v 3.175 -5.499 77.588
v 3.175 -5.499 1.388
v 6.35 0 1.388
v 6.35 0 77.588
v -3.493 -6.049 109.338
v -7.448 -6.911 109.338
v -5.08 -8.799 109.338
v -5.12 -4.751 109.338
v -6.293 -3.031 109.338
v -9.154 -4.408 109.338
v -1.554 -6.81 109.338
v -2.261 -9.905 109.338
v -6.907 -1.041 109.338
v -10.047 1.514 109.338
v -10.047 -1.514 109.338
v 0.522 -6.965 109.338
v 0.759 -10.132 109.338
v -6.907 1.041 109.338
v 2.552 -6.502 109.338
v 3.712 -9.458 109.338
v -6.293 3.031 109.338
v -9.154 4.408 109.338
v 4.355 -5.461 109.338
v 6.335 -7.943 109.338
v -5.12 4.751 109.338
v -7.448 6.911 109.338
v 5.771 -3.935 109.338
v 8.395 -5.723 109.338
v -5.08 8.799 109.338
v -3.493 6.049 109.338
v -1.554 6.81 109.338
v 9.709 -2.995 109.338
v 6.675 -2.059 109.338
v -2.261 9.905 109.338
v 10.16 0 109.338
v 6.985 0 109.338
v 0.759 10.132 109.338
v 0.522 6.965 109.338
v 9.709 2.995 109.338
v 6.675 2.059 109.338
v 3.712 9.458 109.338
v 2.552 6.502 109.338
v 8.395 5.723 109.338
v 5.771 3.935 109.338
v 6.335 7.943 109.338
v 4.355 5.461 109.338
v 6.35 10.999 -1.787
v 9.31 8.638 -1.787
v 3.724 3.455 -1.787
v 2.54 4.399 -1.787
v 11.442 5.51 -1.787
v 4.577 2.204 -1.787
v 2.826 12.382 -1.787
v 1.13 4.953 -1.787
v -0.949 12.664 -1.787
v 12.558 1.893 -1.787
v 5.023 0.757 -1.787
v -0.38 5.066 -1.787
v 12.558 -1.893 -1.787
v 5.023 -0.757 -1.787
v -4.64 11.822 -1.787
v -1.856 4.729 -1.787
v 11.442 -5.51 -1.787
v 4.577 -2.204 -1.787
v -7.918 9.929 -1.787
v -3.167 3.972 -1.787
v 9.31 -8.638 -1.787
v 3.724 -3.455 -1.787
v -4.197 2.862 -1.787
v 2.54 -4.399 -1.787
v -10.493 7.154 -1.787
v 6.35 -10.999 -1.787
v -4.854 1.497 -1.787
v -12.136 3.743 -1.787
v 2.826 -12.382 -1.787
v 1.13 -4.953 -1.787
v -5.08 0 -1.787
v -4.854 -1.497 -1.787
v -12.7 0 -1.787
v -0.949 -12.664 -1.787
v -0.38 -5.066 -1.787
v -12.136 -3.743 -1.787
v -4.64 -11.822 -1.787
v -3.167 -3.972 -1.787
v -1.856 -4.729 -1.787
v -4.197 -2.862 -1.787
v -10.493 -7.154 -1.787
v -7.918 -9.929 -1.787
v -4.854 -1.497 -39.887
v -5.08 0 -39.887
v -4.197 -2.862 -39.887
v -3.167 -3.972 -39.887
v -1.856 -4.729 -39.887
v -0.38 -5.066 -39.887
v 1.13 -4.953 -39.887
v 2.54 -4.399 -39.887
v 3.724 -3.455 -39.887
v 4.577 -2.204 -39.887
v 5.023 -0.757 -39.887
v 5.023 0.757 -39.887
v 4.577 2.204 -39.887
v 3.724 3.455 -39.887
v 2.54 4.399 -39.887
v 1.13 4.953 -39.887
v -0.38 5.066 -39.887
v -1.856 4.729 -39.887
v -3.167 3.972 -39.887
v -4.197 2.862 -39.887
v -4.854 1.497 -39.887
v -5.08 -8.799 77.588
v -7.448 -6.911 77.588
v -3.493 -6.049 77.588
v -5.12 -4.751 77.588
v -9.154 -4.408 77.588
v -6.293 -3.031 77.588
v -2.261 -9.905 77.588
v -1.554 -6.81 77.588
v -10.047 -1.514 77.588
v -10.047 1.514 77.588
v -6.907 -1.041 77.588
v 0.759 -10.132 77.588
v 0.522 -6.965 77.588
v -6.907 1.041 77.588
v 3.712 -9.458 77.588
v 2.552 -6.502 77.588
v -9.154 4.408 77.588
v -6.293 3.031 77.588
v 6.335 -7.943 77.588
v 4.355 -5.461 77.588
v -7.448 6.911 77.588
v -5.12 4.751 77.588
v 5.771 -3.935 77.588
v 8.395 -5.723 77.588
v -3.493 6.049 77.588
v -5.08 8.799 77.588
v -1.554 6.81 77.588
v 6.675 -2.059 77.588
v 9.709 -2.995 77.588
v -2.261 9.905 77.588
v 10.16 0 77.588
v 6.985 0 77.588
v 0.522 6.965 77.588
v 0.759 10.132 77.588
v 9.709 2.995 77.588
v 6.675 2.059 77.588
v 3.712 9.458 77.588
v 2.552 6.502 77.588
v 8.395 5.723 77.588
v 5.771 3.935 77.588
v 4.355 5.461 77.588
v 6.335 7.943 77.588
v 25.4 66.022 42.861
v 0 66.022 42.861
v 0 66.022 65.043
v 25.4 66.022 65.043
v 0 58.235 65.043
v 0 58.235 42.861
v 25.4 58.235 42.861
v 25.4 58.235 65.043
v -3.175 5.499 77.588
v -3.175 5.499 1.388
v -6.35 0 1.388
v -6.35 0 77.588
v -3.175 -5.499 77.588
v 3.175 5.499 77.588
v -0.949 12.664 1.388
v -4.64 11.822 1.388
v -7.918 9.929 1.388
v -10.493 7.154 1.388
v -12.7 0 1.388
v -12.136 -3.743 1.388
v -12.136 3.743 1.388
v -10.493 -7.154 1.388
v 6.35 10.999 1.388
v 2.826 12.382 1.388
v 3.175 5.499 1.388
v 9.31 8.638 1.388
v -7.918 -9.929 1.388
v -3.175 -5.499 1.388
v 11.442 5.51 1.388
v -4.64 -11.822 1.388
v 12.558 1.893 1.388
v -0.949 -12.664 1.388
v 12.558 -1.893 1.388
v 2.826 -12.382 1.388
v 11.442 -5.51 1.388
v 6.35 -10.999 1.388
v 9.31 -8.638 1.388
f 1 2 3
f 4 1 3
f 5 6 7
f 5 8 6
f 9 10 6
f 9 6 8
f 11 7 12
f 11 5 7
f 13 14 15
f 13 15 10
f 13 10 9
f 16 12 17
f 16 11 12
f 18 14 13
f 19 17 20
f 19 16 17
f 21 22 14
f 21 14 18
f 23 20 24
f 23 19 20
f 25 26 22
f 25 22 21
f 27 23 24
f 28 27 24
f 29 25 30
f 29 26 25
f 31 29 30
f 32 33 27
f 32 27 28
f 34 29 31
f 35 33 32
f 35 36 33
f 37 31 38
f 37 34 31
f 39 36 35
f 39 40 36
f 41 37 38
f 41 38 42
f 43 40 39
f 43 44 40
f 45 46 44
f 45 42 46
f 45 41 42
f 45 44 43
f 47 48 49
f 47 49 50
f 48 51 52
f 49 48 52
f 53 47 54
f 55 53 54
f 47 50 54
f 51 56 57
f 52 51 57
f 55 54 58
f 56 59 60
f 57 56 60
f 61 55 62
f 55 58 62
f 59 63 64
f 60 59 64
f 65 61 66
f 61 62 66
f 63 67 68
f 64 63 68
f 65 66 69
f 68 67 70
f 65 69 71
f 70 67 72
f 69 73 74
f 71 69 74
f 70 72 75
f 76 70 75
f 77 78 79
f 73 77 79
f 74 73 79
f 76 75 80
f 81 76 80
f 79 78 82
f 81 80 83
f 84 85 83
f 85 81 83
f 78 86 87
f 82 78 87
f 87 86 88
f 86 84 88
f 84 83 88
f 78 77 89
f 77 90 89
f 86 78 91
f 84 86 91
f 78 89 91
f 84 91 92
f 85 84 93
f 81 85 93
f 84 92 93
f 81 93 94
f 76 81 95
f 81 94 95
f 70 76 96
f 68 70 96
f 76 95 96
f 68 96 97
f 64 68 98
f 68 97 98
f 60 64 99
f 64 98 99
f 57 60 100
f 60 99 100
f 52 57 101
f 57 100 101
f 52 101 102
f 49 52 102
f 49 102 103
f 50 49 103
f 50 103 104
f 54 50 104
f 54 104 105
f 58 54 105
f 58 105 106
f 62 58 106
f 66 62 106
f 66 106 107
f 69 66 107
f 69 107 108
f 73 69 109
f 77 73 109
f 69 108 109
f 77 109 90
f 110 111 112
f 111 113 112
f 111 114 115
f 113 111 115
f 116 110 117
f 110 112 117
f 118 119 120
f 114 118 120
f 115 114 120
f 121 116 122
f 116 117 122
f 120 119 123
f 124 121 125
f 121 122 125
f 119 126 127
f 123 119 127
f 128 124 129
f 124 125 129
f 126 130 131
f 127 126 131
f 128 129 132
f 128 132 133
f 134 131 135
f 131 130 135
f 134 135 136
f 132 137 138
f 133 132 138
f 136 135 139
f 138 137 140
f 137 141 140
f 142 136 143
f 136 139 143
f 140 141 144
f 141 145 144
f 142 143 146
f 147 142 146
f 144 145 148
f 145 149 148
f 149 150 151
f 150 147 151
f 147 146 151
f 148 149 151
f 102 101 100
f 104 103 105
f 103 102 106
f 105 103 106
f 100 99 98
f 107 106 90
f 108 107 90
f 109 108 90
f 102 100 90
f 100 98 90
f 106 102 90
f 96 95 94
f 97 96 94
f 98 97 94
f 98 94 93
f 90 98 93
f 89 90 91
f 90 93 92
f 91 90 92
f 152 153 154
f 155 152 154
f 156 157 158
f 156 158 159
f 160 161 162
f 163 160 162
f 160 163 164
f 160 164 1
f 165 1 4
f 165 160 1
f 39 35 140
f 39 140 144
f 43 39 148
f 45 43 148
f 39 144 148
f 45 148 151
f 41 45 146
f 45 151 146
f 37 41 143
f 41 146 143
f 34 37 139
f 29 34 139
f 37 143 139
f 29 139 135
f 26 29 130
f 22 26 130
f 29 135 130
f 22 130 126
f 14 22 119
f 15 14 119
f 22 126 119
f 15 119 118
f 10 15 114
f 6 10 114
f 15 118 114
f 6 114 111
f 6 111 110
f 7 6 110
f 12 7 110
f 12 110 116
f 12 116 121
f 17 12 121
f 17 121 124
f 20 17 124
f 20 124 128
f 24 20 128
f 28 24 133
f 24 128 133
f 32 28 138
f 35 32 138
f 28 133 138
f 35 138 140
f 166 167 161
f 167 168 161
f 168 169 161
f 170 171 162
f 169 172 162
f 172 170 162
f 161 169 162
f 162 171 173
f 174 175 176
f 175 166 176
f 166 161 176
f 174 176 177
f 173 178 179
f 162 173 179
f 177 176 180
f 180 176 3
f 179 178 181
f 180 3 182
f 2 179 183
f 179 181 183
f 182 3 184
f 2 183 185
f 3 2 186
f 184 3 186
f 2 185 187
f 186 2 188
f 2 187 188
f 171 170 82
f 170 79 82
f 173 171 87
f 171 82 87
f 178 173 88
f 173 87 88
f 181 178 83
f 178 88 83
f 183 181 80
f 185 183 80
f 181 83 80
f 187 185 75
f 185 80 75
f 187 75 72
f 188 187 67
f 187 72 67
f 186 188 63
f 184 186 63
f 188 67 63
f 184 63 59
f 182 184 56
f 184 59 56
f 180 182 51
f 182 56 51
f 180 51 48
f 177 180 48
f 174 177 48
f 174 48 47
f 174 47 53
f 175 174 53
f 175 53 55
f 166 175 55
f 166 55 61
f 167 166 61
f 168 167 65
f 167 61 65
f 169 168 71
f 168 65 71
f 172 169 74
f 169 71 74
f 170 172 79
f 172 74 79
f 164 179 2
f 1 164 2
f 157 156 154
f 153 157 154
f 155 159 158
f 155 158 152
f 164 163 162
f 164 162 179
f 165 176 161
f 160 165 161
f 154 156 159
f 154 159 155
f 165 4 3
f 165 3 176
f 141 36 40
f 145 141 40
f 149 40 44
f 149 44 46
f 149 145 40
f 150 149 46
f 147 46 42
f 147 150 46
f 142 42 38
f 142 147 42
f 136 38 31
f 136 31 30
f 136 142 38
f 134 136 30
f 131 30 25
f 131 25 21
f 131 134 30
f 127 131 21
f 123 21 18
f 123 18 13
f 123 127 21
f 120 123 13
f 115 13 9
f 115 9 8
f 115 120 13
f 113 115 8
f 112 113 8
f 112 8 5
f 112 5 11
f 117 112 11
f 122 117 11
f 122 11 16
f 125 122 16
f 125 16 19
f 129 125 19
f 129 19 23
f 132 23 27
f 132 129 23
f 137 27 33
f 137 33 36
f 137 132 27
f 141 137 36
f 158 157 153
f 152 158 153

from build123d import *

# Parameters (mm, degrees)
F3_DEPTH = 76.2
F4_R     = 10.16
F4_R_2   = 6.985
F5_DEPTH = 31.75
F6_W     = 7.787004
F6_H     = 22.182271
F7_DEPTH = 25.4


with BuildPart() as f1:
    # F0 (on Front) → F1 (revolve)
    with BuildSketch(Plane.XZ):
        Polygon((-5.08, -39.887422), (0, -39.887422), (0, -1.787422), (0, 1.387578), (-12.7, 1.387578), (-12.7, -1.787422), (-5.08, -1.787422), align=None)
    revolve(axis=Axis((0, 0, -20.837422), (0, 0, 1)))

    # F2 (on face) → F3 (join)
    with BuildSketch(Plane.XY.offset(1.387578)):
        Polygon((-3.175, 5.499261), (-6.35, 0), (-3.175, -5.499261), (3.175, -5.499261), (6.35, 0), (3.175, 5.499261), align=None)
    extrude(amount=F3_DEPTH)


with BuildPart() as f5:
    # F4 (on face) → F5 (new body)
    with BuildSketch(Plane.XY.offset(77.587578)):
        Circle(F4_R)
        Circle(F4_R_2, mode=Mode.SUBTRACT)
    extrude(amount=F5_DEPTH)


with BuildPart() as f7:
    # F6 (on Right) → F7 (new body)
    with BuildSketch(Plane.YZ):
        with Locations((62.12832, 53.951665)):
            Rectangle(F6_W, F6_H)
    extrude(amount=F7_DEPTH)


solid = Compound([f1.part, f5.part, f7.part])
